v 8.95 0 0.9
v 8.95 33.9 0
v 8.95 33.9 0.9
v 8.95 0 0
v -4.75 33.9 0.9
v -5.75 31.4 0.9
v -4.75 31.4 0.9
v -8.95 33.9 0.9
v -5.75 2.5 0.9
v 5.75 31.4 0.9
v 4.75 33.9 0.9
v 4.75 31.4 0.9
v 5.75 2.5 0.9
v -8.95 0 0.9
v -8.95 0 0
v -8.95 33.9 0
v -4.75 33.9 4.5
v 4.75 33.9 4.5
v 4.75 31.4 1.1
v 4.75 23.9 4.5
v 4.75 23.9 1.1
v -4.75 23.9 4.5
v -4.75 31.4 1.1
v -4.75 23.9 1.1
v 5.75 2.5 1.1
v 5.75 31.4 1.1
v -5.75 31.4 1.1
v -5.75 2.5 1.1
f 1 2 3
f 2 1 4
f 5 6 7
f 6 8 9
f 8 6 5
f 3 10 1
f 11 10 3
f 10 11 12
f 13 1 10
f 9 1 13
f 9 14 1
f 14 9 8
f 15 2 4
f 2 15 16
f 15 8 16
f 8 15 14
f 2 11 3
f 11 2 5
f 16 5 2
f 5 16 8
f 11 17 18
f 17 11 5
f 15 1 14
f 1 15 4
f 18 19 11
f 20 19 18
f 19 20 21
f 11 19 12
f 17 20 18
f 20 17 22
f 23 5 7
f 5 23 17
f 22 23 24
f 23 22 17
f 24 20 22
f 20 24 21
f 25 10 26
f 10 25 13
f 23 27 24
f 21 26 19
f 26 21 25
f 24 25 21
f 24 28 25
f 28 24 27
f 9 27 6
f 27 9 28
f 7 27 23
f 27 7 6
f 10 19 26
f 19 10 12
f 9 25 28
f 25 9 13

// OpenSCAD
// Dimensions of the board
blength  = 33.6+0.3;
bwidth   = 17.9;
bthick   = 0.9;
bheight  = 4.5;
// Height of the USB port; measured from the bottom of 
// plate
busb     = 9.5;
// Width of the board minus the width of the connector
// pins
bmiddlew = 11.5;
bmiddlew2 = 5;


function micropro_length() = blength;
function micropro_width() = bwidth;
function micropro_thickness() = bthick;


module micropro_example() {
  color("darkred") {
  translate([-bwidth/2, 0, 0])
    cube([bwidth, blength, bthick]);
  translate([-busb/2, blength-10, 0])
    cube([busb, 10, bheight]);
  translate([-bmiddlew/2, 2.5, 0])
    cube([bmiddlew, blength-5, bthick+0.2]);
  }
}

micropro_example();
